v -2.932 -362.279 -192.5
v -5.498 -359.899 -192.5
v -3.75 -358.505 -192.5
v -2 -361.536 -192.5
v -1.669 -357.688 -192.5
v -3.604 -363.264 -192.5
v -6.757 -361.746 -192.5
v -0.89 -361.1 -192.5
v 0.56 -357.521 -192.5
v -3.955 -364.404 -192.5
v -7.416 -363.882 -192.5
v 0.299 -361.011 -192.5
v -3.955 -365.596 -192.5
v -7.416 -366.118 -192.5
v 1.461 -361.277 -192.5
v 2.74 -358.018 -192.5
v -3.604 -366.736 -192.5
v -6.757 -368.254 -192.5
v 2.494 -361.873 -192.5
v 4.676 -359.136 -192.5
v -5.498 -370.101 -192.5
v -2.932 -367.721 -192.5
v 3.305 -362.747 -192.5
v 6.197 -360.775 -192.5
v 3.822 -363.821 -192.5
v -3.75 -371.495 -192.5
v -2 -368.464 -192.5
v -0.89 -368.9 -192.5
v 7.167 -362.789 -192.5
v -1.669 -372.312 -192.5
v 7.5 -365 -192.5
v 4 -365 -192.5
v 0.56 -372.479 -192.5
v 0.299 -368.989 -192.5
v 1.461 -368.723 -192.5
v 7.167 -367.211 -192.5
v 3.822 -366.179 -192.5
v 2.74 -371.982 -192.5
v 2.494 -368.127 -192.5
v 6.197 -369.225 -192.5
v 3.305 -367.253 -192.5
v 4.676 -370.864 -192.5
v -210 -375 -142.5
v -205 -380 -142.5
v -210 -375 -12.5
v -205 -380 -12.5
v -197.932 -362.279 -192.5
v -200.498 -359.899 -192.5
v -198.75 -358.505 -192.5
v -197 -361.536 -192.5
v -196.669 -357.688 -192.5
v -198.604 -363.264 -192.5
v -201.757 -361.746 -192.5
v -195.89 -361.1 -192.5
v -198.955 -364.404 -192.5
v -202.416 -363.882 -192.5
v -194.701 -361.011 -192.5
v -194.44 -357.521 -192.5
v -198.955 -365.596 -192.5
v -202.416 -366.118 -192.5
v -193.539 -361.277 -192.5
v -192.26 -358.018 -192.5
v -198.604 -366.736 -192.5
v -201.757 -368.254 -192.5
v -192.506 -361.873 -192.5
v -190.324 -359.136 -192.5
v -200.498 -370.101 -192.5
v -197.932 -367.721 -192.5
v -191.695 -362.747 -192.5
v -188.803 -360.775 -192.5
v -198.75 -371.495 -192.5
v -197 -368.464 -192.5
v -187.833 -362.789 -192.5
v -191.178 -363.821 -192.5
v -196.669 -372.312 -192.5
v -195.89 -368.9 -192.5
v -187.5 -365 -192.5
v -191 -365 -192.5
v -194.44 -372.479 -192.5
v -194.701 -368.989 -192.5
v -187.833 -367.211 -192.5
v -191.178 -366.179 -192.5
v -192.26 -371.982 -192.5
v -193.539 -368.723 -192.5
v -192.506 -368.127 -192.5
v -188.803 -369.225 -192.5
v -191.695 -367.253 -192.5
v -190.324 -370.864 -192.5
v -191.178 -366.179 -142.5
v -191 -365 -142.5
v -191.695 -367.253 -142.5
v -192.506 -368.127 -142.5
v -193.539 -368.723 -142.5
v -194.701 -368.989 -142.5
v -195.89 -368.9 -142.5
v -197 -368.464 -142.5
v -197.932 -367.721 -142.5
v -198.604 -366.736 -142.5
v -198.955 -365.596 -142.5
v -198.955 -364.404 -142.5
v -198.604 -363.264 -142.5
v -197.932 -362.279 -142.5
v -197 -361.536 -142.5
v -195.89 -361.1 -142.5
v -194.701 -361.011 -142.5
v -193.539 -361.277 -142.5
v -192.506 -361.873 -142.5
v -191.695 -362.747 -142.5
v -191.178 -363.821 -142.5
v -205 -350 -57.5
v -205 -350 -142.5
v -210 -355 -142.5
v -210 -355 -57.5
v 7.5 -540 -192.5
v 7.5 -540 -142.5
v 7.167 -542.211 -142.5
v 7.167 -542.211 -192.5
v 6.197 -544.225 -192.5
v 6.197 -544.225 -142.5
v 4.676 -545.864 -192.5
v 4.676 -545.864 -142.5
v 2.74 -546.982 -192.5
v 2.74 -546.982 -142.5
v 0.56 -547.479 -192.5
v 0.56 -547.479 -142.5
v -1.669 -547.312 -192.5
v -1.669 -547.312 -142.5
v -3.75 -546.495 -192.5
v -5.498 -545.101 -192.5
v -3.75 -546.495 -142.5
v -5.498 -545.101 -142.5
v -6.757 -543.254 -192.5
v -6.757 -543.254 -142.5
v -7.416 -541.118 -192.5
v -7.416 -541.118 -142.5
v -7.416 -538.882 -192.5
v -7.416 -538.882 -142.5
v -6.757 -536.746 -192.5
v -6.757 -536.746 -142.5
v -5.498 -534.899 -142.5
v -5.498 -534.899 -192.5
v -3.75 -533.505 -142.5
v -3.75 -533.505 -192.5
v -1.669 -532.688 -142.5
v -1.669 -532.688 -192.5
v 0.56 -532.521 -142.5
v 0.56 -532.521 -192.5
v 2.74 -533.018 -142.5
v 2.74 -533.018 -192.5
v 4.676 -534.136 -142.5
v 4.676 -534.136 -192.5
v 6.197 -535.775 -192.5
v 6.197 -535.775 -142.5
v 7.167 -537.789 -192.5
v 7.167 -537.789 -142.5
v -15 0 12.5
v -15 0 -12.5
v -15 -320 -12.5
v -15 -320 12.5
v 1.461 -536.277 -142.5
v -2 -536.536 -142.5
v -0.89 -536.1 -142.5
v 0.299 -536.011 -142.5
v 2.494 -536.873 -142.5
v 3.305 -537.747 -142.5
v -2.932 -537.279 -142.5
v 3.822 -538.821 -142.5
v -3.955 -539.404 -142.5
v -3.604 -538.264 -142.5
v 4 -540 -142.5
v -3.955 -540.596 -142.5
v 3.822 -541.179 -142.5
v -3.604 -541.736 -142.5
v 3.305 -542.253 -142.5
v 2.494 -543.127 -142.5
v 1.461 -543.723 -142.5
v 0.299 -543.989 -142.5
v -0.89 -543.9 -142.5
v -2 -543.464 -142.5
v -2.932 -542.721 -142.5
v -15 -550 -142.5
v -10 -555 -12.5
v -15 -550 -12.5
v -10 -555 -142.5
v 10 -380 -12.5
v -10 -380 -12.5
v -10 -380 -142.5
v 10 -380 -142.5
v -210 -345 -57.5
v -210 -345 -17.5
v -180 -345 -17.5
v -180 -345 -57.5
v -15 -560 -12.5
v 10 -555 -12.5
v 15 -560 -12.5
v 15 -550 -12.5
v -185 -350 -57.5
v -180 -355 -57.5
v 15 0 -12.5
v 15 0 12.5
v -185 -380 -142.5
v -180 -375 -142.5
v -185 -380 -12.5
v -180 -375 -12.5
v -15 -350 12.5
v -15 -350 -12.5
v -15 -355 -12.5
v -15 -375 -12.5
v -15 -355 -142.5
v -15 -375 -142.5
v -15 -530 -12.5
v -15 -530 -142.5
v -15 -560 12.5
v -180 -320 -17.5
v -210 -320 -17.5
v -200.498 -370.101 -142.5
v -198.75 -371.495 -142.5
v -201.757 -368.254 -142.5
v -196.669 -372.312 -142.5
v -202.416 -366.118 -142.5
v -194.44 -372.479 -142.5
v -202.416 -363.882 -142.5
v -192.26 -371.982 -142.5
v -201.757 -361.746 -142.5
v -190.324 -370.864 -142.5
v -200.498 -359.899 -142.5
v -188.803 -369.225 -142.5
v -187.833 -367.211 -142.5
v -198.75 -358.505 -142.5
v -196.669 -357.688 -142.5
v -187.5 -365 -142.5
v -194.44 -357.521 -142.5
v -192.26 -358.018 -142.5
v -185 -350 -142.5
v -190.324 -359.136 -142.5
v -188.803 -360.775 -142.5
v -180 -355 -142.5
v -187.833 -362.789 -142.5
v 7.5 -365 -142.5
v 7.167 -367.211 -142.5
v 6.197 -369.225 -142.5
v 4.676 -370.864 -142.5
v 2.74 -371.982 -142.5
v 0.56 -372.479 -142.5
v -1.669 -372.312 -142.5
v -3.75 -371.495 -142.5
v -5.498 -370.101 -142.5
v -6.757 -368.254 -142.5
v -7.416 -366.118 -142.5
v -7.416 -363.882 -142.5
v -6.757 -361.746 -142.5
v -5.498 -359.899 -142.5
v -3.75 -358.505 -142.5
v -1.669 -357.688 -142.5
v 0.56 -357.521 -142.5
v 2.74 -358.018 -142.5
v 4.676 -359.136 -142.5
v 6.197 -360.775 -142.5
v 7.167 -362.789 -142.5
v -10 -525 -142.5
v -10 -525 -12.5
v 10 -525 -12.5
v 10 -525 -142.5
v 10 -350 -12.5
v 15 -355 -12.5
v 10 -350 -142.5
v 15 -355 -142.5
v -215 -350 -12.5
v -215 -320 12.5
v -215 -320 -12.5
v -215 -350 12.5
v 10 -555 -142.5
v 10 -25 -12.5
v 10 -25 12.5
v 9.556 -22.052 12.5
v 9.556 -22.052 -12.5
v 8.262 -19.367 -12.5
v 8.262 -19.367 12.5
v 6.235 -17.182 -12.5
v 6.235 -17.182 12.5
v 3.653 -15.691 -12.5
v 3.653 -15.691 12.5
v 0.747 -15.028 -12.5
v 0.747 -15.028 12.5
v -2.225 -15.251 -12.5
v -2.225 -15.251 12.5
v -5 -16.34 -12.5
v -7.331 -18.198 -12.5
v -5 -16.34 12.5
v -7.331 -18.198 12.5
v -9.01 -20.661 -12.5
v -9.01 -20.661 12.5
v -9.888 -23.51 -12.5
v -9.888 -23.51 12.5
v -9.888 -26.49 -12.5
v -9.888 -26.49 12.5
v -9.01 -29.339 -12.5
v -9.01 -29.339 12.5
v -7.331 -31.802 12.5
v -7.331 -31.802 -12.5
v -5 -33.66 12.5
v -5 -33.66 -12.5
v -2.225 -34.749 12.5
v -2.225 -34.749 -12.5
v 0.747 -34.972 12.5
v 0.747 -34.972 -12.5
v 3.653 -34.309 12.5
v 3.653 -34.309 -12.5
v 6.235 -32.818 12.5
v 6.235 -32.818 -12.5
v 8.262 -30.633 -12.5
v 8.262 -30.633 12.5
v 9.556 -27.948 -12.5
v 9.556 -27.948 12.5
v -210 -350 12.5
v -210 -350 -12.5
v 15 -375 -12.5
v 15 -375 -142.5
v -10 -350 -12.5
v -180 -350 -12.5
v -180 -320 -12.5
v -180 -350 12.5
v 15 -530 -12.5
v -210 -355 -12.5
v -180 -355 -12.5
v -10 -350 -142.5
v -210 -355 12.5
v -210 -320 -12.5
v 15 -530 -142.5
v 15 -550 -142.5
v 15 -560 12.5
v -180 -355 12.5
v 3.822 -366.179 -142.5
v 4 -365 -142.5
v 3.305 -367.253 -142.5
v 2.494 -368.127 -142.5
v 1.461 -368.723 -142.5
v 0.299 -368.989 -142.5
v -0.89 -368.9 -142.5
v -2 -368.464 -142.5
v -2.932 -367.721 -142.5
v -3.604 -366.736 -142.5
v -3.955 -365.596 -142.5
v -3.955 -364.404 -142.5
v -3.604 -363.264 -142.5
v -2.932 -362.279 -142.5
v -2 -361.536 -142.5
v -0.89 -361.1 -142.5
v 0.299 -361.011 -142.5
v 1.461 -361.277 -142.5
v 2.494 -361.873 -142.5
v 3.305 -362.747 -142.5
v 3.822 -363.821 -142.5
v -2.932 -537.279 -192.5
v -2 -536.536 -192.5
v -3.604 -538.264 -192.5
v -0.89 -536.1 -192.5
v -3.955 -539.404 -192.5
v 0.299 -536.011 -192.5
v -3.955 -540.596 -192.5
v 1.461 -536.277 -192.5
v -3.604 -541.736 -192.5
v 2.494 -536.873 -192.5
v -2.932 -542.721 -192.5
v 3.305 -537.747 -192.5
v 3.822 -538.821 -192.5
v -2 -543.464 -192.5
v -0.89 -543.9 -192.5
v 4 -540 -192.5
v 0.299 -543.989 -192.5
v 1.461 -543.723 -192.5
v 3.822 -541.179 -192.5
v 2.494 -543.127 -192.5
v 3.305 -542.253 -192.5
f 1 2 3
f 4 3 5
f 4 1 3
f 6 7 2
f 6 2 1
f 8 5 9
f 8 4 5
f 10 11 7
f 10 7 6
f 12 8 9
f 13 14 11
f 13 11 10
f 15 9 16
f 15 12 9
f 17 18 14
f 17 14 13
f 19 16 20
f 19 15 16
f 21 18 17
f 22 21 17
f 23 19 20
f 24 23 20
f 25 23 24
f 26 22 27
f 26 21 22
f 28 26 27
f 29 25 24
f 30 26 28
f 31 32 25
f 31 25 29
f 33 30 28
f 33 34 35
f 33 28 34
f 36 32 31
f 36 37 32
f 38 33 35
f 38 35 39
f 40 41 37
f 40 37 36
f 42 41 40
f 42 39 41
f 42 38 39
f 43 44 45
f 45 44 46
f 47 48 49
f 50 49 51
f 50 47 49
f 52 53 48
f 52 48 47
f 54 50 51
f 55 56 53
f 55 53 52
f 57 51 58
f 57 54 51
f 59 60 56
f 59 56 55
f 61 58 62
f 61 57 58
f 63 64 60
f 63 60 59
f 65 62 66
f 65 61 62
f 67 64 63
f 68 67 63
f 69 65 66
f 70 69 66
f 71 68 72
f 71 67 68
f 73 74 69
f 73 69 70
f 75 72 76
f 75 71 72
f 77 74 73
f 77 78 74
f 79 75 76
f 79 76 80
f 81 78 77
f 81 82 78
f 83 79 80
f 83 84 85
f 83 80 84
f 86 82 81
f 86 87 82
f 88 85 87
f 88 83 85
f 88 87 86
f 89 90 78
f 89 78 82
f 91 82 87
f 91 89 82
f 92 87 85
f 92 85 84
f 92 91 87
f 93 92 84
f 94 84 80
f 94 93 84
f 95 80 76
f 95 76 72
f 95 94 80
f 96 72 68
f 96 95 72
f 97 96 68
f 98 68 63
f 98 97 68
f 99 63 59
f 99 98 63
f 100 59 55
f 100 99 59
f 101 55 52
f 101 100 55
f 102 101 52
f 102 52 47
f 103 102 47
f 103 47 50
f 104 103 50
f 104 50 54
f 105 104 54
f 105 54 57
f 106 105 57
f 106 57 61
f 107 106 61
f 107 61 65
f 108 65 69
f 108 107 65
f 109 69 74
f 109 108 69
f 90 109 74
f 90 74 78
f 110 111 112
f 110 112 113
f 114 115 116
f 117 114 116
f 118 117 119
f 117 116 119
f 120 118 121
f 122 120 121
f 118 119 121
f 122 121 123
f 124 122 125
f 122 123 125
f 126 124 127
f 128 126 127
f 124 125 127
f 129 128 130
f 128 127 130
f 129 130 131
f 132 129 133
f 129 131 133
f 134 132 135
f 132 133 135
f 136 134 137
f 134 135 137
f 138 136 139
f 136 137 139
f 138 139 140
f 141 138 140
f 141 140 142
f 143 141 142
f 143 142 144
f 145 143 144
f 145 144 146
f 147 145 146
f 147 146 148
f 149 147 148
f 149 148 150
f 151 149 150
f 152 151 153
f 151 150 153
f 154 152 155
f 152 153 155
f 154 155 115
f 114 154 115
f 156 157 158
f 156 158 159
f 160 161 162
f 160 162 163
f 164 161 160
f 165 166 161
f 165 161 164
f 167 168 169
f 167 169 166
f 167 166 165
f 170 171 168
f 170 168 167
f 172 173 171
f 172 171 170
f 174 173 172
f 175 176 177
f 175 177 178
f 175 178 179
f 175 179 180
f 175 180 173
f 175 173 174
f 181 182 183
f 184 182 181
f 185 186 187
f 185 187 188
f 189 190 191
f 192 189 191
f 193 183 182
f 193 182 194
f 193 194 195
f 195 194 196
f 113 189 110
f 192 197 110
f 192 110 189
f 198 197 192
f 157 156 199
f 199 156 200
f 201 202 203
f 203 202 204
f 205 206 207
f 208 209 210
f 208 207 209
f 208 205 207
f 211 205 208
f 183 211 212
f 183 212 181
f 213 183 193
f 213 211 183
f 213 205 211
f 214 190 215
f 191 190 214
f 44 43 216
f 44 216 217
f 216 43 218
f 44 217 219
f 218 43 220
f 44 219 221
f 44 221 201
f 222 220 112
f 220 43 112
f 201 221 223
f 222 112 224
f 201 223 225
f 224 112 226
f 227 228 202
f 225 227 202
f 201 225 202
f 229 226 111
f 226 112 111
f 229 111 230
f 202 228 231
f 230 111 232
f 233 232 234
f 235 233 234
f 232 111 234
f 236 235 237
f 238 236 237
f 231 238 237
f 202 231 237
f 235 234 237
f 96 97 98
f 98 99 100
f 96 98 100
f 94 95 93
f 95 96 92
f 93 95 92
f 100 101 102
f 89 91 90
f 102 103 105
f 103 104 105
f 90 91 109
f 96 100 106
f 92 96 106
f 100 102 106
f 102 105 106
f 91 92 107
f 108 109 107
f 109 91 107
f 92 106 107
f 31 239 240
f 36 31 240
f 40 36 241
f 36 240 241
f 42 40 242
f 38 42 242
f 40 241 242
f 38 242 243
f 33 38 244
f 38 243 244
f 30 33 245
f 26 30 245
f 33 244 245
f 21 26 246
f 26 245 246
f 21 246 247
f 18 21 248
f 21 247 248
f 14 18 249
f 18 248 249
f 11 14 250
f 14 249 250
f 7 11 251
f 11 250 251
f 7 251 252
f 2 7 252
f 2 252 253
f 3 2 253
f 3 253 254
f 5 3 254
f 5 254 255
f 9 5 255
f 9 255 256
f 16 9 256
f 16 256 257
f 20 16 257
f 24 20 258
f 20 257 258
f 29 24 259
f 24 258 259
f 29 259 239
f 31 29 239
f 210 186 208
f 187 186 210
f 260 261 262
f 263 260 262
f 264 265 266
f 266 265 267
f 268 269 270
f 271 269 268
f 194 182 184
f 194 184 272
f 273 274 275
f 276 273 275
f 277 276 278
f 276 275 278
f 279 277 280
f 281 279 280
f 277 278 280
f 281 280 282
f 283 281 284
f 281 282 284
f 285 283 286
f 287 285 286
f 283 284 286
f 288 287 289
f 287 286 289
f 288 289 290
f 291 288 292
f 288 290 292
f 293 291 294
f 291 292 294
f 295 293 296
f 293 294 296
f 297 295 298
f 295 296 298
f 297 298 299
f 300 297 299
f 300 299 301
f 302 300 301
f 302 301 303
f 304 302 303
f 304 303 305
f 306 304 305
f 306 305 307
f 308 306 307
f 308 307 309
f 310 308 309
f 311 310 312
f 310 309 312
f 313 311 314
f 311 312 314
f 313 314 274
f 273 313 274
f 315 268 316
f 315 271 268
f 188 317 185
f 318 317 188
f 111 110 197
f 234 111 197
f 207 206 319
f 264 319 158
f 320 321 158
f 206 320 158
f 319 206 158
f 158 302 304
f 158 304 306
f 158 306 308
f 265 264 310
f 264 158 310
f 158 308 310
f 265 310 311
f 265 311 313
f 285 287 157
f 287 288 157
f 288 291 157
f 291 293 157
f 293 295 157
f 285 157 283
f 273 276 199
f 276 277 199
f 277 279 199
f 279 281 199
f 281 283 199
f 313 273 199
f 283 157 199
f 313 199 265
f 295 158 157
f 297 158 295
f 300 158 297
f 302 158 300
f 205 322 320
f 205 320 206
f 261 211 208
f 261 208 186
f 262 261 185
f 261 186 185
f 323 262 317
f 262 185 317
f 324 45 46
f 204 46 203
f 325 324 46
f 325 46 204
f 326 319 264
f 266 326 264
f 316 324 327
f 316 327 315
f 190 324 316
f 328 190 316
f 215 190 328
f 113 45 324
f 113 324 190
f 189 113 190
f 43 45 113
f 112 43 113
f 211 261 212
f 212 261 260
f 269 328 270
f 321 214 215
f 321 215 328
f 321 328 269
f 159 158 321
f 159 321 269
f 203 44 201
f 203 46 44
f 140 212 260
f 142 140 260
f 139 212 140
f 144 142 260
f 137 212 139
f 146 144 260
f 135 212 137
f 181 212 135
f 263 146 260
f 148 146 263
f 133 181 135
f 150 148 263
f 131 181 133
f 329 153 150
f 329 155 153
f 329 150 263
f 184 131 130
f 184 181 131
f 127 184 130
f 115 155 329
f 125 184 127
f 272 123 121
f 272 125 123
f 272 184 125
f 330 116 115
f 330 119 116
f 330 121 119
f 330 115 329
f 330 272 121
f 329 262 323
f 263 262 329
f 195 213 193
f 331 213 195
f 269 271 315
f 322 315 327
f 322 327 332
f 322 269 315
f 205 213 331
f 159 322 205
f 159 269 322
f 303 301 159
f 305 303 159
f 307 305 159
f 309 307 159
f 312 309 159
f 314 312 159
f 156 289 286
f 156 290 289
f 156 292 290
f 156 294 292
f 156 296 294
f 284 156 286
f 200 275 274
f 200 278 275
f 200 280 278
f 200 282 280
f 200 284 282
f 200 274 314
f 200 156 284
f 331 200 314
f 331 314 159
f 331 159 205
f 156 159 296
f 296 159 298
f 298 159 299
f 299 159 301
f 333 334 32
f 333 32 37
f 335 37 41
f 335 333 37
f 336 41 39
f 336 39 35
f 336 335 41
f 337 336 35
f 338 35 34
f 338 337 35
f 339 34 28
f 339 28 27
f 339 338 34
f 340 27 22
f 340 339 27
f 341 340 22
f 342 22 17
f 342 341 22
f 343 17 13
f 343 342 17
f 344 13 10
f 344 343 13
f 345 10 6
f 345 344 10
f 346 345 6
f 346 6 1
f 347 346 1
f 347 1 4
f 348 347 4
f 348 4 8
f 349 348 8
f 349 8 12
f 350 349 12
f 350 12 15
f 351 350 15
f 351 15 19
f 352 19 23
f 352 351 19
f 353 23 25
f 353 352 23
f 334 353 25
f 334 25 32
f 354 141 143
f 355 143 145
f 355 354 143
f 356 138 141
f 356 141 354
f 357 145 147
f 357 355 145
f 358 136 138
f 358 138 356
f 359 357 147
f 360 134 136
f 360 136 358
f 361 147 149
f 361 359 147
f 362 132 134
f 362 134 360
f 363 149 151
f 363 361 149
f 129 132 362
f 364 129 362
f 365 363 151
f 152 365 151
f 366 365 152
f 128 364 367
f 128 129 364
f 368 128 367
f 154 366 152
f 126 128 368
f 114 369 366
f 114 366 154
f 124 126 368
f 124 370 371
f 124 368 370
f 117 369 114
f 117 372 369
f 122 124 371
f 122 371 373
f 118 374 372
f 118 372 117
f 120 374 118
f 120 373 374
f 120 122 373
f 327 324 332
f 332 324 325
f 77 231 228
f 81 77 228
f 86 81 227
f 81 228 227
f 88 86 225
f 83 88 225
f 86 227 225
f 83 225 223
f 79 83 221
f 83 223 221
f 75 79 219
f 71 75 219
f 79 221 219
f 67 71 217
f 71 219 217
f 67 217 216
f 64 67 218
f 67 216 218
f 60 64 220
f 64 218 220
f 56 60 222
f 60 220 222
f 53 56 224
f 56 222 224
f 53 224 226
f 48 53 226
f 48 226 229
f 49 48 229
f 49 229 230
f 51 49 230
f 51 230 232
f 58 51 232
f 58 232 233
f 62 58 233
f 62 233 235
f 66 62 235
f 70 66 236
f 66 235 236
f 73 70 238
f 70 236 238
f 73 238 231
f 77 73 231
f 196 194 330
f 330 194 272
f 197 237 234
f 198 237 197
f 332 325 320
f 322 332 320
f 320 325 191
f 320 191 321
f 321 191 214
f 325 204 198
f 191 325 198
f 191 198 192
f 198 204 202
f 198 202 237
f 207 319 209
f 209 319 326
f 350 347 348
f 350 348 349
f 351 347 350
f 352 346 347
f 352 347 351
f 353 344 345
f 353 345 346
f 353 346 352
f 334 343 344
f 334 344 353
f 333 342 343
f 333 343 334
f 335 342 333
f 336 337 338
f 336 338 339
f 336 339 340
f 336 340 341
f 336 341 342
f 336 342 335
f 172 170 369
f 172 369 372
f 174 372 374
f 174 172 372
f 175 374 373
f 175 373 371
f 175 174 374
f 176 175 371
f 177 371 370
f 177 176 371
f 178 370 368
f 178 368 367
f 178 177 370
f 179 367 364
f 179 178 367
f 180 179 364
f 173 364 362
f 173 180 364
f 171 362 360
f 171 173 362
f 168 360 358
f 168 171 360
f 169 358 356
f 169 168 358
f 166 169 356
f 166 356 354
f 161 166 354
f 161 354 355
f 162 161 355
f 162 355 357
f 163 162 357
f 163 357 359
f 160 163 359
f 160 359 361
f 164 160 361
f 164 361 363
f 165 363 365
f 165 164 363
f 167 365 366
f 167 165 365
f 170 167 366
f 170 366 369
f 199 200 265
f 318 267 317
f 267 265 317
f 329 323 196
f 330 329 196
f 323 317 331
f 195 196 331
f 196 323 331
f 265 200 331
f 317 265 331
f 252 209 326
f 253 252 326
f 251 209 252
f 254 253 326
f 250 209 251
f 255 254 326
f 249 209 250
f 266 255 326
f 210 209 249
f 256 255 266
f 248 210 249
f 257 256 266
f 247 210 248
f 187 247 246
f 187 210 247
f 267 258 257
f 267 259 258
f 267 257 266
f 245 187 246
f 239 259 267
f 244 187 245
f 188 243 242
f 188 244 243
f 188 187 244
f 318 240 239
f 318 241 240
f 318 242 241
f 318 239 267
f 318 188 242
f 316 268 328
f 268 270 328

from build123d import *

# Parameters (mm, degrees)
F0_W      = 30
F0_H      = 25
F1_DEPTH  = 560
F2_W      = 30
F2_H      = 25
F3_DEPTH  = 200
F4_R      = 10
F5_DEPTH  = 25
F6_W      = 30
F6_H      = 30
F7_DEPTH  = 130
F8_SIZE   = 5
F9_R      = 7.5
F9_R_2    = 4
F10_DEPTH = 50
F12_R     = 7.5
F12_R_2   = 4
F13_DEPTH = 50
F14_W     = 30
F14_H     = 30
F15_DEPTH = 5
F16_W     = 30
F16_H     = 5
F17_DEPTH = 40
F18_W     = 30
F18_H     = 130
F19_DEPTH = 30
F20_SIZE  = 5
F21_R     = 7.5
F21_R_2   = 4
F22_DEPTH = 50
F23_W     = 30
F23_H     = 5
F24_DEPTH = 25


# Not quite as in the source:
# - two fillets or chamfers of one size are made in one step


with BuildPart() as f1:
    # F0 (on Front) → F1 (new body)
    with BuildSketch(Plane.XZ):
        Rectangle(F0_W, F0_H)
    extrude(amount=F1_DEPTH)

    # F2 (on face) → F3 (join)
    with BuildSketch(Plane(origin=(-15, 0, 0), x_dir=(0, -1, 0), z_dir=(-1, 0, 0))):
        with Locations((335, 0)):
            Rectangle(F2_W, F2_H)
    extrude(amount=F3_DEPTH)

    # F4 (on face) → F5 (cut)
    with BuildSketch(Plane.XY.offset(12.5)):
        with Locations((0, -25)):
            Circle(F4_R)
    extrude(amount=-F5_DEPTH, mode=Mode.SUBTRACT)

    # F6 (on face) → F7 (join)
    with BuildSketch(Plane(origin=(0, 0, -12.5), x_dir=(1, 0, 0), z_dir=(0, 0, -1))):
        with Locations((0, 540)):
            Rectangle(F6_W, F6_H)
        with Locations((0, 365)):
            Rectangle(F6_W, F6_H)
    extrude(amount=F7_DEPTH)

    # F8
    f8_edges = [f1.edges().sort_by_distance(p)[0] for p in [
        (-15, -555, -77.5),
        (15, -555, -77.5),
        (15, -525, -77.5),
        (-15, -525, -77.5),
        (15, -350, -77.5),
        (15, -380, -77.5),
        (-15, -350, -77.5),
        (-15, -380, -77.5),
    ]]
    chamfer(f8_edges, length=F8_SIZE)

    # F9 (on face) → F10 (join)
    with BuildSketch(Plane(origin=(0, 0, -142.5), x_dir=(1, 0, 0), z_dir=(0, 0, -1))):
        with Locations((0, 540)):
            Circle(F9_R)
        with Locations((0, 540)):
            Circle(F9_R_2, mode=Mode.SUBTRACT)
    extrude(amount=F10_DEPTH)

    # F12 (on face) → F13 (join)
    with BuildSketch(Plane(origin=(0, 0, -142.5), x_dir=(1, 0, 0), z_dir=(0, 0, -1))):
        with Locations((0, 365)):
            Circle(F12_R)
        with Locations((0, 365)):
            Circle(F12_R_2, mode=Mode.SUBTRACT)
    extrude(amount=F13_DEPTH)

    # F14 (on face) → F15 (join)
    with BuildSketch(Plane(origin=(0, 0, -12.5), x_dir=(1, 0, 0), z_dir=(0, 0, -1))):
        with Locations((-195, 335)):
            Rectangle(F14_W, F14_H)
    extrude(amount=F15_DEPTH)

    # F16 (on face) → F17 (join)
    with BuildSketch(Plane(origin=(0, 0, -17.5), x_dir=(1, 0, 0), z_dir=(0, 0, -1))):
        with Locations((-195, 347.5)):
            Rectangle(F16_W, F16_H)
    extrude(amount=F17_DEPTH)

    # F18 (on face) → F19 (join)
    with BuildSketch(Plane.XZ.offset(350)):
        with Locations((-195, -77.5)):
            Rectangle(F18_W, F18_H)
    extrude(amount=F19_DEPTH)

    # F20
    f20_edges = [f1.edges().sort_by_distance(p)[0] for p in [
        (-210, -380, -77.5),
        (-180, -380, -77.5),
        (-180, -350, -100),
        (-210, -350, -100),
    ]]
    chamfer(f20_edges, length=F20_SIZE)

    # F21 (on face) → F22 (join)
    with BuildSketch(Plane(origin=(0, 0, -142.5), x_dir=(1, 0, 0), z_dir=(0, 0, -1))):
        with Locations((-195, 365)):
            Circle(F21_R)
        with Locations((-195, 365)):
            Circle(F21_R_2, mode=Mode.SUBTRACT)
    extrude(amount=F22_DEPTH)

    # F23 (on face) → F24 (join)
    with BuildSketch(Plane.XY.offset(-12.5)):
        with Locations((-195, -352.5)):
            Rectangle(F23_W, F23_H)
    extrude(amount=F24_DEPTH)


solid = f1.part
